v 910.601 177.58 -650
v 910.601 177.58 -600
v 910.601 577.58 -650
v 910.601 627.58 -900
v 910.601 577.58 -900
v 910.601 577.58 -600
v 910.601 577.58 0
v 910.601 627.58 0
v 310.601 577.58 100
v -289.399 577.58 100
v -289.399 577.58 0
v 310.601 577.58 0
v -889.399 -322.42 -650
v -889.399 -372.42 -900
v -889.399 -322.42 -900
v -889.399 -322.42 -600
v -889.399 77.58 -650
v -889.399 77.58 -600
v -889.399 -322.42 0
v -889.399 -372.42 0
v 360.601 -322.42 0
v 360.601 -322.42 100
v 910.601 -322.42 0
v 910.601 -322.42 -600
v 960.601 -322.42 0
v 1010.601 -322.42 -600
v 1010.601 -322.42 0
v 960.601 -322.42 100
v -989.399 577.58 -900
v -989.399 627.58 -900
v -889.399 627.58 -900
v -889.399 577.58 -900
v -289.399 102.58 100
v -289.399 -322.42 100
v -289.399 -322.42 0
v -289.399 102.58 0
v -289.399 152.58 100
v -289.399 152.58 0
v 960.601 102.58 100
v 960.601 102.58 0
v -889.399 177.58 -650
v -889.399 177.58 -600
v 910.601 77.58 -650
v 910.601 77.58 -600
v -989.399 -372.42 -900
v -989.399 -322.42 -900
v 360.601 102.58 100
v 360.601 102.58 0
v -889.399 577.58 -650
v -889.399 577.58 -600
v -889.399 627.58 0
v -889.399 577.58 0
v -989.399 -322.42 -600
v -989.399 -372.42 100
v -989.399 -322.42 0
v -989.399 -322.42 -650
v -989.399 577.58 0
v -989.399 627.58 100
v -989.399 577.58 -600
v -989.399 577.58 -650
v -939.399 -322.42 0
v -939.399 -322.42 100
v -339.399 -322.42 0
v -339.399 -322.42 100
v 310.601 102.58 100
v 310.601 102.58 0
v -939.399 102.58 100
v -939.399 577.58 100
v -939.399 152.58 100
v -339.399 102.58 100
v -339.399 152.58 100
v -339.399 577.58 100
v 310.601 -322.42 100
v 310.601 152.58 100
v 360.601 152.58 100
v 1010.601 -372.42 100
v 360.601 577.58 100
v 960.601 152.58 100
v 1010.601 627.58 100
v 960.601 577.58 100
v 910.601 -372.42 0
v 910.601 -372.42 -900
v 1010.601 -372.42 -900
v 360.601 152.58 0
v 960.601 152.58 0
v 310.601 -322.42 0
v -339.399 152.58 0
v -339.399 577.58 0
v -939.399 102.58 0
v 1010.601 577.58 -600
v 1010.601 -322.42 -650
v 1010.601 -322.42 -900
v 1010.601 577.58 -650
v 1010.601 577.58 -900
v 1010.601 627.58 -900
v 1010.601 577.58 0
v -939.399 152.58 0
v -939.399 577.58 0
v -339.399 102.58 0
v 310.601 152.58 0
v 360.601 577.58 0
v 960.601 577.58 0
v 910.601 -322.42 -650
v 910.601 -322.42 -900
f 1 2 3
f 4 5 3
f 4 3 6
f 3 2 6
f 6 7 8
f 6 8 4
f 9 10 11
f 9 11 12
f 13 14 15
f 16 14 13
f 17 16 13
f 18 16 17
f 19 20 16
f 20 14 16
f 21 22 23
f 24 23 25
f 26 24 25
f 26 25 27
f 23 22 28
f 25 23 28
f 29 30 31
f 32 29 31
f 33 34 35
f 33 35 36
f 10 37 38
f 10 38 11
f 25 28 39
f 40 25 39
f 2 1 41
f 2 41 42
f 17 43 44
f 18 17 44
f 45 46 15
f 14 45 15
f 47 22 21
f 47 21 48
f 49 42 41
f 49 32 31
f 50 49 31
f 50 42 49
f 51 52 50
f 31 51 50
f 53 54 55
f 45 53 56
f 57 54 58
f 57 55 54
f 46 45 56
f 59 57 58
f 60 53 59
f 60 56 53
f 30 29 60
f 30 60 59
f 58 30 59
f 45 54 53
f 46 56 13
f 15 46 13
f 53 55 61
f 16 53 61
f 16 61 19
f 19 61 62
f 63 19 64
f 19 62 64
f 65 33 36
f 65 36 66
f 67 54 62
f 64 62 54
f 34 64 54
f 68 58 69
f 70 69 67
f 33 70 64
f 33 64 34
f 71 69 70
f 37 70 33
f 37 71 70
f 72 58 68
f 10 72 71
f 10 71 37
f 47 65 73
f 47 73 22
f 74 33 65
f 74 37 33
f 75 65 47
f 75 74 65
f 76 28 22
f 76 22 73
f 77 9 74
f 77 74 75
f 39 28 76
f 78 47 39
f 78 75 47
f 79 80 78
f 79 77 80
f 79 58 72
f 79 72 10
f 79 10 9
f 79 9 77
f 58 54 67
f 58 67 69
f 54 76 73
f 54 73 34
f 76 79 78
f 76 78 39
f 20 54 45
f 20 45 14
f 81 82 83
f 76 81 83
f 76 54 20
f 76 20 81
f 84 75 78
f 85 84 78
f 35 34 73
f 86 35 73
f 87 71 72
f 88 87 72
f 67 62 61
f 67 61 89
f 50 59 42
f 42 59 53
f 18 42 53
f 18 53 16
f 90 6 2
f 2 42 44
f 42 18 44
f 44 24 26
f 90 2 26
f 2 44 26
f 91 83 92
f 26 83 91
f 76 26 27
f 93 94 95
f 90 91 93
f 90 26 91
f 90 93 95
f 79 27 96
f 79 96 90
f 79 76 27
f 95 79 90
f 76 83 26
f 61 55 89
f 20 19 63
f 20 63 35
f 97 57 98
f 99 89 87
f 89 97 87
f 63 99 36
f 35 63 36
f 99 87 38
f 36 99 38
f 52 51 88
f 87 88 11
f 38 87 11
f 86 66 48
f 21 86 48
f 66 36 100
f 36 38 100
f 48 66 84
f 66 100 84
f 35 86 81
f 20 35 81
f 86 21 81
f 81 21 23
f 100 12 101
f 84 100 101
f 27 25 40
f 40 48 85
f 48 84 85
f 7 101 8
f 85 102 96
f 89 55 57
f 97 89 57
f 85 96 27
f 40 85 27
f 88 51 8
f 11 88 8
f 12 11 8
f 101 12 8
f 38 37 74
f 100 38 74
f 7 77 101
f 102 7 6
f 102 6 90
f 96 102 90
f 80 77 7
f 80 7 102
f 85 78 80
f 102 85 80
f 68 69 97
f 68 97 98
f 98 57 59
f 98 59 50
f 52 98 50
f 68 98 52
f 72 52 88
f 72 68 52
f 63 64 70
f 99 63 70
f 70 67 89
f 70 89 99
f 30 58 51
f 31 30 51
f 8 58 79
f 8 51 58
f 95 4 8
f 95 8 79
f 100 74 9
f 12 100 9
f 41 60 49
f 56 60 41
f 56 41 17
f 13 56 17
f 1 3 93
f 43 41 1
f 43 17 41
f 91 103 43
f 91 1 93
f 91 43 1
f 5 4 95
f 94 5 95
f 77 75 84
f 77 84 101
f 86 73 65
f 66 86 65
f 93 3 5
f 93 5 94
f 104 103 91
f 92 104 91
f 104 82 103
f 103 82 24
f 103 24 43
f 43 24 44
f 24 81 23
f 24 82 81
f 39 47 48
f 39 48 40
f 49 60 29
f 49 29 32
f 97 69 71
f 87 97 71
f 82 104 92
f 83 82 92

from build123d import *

# Parameters (mm, degrees)
F0_W     = 2000
F0_H     = 1000
F1_DEPTH = 100
F2_W     = 600
F2_H     = 425
F3_DEPTH = 640
F4_W     = 100
F4_H     = 50
F5_DEPTH = 1000
F6_W     = 100
F6_H     = 50
F7_DEPTH = 1000
F8_W     = 100
F8_H     = 50
F9_DEPTH = 2000


with BuildPart() as f1:
    # F0 (on Top) → F1 (new body)
    with BuildSketch(Plane.XY):
        with Locations((10.600965, 127.579693)):
            Rectangle(F0_W, F0_H)
    extrude(amount=F1_DEPTH)

    # F2 (on face) → F3 (cut)
    with BuildSketch(Plane.XY.offset(100)):
        with Locations((-639.399035, 365.079693)):
            Rectangle(F2_W, F2_H)
        with Locations((-639.399035, -109.920307)):
            Rectangle(F2_W, F2_H)
        with Locations((10.600965, 365.079693)):
            Rectangle(F2_W, F2_H)
        with Locations((660.600965, 365.079693)):
            Rectangle(F2_W, F2_H)
        with Locations((10.600965, -109.920307)):
            Rectangle(F2_W, F2_H)
        with Locations((660.600965, -109.920307)):
            Rectangle(F2_W, F2_H)
    extrude(amount=-F3_DEPTH, mode=Mode.SUBTRACT)

    # F4 (on face) → F5 (join)
    with BuildSketch(Plane.XY.offset(100)):
        with Locations((960.600965, 602.579693)):
            Rectangle(F4_W, F4_H)
        with Locations((-939.399035, -347.420307)):
            Rectangle(F4_W, F4_H)
        with Locations((-939.399035, 602.579693)):
            Rectangle(F4_W, F4_H)
        with Locations((960.600965, -347.420307)):
            Rectangle(F4_W, F4_H)
    extrude(amount=-F5_DEPTH)

    # F6 (on face) → F7 (join)
    with BuildSketch(Plane.XZ.offset(372.420307)):
        with Locations((-939.399035, -625)):
            Rectangle(F6_W, F6_H)
        with Locations((960.600965, -625)):
            Rectangle(F6_W, F6_H)
    extrude(amount=-F7_DEPTH)

    # F8 (on face) → F9 (join)
    with BuildSketch(Plane.YZ.offset(1010.600965)):
        with Locations((127.579693, -625)):
            Rectangle(F8_W, F8_H)
    extrude(amount=-F9_DEPTH)


solid = f1.part
